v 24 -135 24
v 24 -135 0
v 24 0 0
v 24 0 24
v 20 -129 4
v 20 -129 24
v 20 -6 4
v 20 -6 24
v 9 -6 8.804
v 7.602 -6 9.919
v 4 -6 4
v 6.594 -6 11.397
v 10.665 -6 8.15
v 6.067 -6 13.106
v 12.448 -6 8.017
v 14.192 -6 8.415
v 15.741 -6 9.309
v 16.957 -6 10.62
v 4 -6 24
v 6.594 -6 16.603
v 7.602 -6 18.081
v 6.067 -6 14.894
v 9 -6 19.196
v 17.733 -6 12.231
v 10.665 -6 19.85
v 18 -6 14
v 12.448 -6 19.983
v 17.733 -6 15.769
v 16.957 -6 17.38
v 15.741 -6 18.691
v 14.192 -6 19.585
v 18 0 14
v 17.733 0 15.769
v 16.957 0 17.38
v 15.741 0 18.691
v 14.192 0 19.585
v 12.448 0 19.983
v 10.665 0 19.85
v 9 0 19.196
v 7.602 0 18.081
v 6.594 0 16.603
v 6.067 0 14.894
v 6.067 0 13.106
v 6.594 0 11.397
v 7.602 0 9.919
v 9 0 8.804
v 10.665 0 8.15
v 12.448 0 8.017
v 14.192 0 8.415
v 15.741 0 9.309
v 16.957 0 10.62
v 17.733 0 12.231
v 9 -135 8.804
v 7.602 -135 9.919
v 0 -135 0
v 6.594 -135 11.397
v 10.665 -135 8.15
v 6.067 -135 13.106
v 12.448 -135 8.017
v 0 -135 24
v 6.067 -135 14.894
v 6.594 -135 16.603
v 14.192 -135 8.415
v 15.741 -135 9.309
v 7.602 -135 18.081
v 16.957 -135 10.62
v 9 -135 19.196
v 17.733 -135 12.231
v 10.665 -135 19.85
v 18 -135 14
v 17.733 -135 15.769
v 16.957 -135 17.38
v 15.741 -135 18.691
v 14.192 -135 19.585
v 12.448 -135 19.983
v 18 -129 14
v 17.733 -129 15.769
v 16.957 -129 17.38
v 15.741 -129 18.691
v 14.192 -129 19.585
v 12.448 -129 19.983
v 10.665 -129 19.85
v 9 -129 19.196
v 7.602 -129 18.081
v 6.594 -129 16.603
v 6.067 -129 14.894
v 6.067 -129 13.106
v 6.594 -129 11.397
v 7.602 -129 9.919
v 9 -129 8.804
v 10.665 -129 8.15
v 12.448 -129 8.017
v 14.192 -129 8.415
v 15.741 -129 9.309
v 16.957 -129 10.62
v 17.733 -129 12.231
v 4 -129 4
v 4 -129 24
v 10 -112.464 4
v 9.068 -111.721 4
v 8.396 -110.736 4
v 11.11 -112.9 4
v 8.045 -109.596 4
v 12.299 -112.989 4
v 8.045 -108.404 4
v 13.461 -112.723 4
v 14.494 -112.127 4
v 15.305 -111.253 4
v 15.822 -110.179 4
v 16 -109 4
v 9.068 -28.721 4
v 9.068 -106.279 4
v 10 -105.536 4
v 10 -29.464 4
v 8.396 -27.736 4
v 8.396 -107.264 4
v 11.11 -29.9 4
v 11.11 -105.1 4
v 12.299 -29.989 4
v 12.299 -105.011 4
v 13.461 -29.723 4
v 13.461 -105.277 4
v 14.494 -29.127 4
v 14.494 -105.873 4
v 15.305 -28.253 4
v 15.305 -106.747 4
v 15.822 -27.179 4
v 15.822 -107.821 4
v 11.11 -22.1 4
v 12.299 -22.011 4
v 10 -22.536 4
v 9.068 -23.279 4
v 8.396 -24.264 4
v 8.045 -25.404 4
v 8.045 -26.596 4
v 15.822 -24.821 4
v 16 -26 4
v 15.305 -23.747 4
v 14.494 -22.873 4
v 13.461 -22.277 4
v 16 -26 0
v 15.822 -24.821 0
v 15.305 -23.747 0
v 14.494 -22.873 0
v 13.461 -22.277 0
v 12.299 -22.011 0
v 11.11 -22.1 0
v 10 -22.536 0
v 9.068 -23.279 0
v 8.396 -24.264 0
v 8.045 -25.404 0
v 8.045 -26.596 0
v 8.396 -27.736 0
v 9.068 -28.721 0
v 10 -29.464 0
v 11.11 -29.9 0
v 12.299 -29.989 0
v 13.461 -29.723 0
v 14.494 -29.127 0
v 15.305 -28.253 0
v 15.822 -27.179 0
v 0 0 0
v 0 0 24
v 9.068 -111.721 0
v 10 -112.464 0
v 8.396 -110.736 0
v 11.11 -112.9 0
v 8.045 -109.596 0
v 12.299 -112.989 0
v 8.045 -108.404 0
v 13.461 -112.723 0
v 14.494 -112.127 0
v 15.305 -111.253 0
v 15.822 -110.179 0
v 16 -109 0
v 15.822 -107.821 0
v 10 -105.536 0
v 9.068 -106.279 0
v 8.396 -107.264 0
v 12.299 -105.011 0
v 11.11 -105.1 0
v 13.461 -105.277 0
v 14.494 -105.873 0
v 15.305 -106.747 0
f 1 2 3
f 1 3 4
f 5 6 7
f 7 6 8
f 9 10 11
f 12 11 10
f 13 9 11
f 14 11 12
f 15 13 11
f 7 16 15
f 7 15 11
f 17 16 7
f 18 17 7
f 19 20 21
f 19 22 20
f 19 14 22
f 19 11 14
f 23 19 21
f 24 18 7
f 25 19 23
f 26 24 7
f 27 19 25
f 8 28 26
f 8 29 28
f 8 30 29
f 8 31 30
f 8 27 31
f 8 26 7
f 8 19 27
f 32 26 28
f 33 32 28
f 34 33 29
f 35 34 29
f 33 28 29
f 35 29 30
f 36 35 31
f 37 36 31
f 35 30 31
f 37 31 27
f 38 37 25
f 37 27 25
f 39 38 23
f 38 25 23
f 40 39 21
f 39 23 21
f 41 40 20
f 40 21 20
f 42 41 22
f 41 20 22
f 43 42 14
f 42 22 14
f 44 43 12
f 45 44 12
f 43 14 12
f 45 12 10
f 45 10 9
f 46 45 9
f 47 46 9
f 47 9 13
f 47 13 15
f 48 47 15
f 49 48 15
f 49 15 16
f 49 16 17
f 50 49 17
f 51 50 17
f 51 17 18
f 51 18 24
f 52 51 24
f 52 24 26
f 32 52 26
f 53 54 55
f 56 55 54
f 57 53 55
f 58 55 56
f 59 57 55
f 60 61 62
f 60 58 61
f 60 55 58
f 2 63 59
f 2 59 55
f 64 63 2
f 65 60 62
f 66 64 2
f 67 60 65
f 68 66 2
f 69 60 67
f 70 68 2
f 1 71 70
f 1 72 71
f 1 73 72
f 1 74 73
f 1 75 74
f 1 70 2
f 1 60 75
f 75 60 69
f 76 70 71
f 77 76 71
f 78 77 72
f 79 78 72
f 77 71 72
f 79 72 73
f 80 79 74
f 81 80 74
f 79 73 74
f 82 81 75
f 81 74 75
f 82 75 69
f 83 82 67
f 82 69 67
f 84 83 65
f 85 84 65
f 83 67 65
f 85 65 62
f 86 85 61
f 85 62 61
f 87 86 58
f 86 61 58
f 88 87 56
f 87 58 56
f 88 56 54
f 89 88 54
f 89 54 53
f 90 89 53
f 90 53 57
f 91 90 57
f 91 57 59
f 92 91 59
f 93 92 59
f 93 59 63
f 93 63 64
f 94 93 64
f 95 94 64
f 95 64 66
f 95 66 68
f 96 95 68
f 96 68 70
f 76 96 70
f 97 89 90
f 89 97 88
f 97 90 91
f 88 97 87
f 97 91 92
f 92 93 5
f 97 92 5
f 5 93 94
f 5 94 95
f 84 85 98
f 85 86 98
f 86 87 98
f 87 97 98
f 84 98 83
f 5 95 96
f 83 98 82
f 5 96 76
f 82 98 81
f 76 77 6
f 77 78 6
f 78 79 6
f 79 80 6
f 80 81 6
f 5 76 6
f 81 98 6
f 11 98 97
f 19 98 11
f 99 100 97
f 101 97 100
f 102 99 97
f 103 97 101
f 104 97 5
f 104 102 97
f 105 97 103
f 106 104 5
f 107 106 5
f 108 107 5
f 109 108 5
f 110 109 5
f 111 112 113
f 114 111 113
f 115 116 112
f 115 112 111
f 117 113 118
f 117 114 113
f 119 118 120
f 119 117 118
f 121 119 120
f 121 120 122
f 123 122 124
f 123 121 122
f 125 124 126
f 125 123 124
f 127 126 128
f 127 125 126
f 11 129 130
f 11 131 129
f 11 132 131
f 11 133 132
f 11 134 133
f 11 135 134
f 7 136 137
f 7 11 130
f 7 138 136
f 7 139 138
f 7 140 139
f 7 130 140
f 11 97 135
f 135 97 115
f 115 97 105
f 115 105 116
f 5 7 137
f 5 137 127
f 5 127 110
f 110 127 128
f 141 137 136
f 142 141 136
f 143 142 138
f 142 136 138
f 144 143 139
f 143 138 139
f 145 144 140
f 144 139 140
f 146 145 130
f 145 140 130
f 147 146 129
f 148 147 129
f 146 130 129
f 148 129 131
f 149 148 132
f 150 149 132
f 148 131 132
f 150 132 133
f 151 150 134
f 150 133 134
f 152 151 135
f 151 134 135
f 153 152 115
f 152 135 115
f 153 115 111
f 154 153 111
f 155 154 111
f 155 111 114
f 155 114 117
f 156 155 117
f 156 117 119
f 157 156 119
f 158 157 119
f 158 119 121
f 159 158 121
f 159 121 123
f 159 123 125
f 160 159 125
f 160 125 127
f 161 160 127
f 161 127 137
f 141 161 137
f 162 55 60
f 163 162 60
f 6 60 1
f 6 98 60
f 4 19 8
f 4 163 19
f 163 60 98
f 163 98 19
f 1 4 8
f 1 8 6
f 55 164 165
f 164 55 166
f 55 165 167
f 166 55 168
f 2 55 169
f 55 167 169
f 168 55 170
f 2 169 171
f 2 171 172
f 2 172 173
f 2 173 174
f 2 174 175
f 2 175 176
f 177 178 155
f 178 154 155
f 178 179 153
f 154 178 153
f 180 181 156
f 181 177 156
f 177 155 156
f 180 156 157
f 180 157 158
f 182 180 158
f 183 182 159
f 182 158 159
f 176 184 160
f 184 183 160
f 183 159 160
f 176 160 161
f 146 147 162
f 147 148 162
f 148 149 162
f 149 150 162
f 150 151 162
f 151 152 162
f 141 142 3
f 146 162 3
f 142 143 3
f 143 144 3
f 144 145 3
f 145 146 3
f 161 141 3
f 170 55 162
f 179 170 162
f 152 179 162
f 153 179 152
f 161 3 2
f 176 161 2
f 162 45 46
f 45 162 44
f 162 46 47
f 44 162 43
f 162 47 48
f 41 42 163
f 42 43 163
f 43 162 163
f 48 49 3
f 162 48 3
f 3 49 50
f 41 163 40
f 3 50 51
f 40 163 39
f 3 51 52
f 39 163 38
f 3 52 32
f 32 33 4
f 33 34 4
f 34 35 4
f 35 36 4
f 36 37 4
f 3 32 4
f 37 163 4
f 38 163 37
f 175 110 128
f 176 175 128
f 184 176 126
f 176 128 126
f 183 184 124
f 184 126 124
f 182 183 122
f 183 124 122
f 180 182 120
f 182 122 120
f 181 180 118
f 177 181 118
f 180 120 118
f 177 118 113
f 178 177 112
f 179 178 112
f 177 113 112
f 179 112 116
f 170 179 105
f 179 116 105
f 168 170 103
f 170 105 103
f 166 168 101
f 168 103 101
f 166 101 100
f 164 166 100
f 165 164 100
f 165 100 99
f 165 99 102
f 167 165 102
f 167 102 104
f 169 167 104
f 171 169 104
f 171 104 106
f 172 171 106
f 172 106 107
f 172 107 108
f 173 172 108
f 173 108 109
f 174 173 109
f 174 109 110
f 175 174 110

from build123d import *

# Parameters (mm, degrees)
F0_W     = 24
F0_H     = 24
F1_DEPTH = 135
F2_W     = 16
F2_H     = 123
F3_DEPTH = 20
F4_R     = 6
F5_DEPTH = 135.001
F6_R     = 4
F7_DEPTH = 25


with BuildPart() as f1:
    # F0 (on Front) → F1 (new body)
    with BuildSketch(Plane.XZ):
        with Locations((12, 12)):
            Rectangle(F0_W, F0_H)
    extrude(amount=F1_DEPTH)

    # F2 (on face) → F3 (cut)
    with BuildSketch(Plane.XY.offset(24)):
        with Locations((12, -67.5)):
            Rectangle(F2_W, F2_H)
    extrude(amount=-F3_DEPTH, mode=Mode.SUBTRACT)

    # F4 (on face) → F5 (cut, through all)
    with BuildSketch(Plane.XZ.offset(135)):
        with Locations((12, 14)):
            Circle(F4_R)
    extrude(amount=-F5_DEPTH, mode=Mode.SUBTRACT)

    # F6 (on face) → F7 (cut)
    with BuildSketch(Plane.XY.offset(4)):
        with Locations((12, -26)):
            Circle(F6_R)
        with Locations((12, -109)):
            Circle(F6_R)
    extrude(amount=-F7_DEPTH, mode=Mode.SUBTRACT)


solid = f1.part
